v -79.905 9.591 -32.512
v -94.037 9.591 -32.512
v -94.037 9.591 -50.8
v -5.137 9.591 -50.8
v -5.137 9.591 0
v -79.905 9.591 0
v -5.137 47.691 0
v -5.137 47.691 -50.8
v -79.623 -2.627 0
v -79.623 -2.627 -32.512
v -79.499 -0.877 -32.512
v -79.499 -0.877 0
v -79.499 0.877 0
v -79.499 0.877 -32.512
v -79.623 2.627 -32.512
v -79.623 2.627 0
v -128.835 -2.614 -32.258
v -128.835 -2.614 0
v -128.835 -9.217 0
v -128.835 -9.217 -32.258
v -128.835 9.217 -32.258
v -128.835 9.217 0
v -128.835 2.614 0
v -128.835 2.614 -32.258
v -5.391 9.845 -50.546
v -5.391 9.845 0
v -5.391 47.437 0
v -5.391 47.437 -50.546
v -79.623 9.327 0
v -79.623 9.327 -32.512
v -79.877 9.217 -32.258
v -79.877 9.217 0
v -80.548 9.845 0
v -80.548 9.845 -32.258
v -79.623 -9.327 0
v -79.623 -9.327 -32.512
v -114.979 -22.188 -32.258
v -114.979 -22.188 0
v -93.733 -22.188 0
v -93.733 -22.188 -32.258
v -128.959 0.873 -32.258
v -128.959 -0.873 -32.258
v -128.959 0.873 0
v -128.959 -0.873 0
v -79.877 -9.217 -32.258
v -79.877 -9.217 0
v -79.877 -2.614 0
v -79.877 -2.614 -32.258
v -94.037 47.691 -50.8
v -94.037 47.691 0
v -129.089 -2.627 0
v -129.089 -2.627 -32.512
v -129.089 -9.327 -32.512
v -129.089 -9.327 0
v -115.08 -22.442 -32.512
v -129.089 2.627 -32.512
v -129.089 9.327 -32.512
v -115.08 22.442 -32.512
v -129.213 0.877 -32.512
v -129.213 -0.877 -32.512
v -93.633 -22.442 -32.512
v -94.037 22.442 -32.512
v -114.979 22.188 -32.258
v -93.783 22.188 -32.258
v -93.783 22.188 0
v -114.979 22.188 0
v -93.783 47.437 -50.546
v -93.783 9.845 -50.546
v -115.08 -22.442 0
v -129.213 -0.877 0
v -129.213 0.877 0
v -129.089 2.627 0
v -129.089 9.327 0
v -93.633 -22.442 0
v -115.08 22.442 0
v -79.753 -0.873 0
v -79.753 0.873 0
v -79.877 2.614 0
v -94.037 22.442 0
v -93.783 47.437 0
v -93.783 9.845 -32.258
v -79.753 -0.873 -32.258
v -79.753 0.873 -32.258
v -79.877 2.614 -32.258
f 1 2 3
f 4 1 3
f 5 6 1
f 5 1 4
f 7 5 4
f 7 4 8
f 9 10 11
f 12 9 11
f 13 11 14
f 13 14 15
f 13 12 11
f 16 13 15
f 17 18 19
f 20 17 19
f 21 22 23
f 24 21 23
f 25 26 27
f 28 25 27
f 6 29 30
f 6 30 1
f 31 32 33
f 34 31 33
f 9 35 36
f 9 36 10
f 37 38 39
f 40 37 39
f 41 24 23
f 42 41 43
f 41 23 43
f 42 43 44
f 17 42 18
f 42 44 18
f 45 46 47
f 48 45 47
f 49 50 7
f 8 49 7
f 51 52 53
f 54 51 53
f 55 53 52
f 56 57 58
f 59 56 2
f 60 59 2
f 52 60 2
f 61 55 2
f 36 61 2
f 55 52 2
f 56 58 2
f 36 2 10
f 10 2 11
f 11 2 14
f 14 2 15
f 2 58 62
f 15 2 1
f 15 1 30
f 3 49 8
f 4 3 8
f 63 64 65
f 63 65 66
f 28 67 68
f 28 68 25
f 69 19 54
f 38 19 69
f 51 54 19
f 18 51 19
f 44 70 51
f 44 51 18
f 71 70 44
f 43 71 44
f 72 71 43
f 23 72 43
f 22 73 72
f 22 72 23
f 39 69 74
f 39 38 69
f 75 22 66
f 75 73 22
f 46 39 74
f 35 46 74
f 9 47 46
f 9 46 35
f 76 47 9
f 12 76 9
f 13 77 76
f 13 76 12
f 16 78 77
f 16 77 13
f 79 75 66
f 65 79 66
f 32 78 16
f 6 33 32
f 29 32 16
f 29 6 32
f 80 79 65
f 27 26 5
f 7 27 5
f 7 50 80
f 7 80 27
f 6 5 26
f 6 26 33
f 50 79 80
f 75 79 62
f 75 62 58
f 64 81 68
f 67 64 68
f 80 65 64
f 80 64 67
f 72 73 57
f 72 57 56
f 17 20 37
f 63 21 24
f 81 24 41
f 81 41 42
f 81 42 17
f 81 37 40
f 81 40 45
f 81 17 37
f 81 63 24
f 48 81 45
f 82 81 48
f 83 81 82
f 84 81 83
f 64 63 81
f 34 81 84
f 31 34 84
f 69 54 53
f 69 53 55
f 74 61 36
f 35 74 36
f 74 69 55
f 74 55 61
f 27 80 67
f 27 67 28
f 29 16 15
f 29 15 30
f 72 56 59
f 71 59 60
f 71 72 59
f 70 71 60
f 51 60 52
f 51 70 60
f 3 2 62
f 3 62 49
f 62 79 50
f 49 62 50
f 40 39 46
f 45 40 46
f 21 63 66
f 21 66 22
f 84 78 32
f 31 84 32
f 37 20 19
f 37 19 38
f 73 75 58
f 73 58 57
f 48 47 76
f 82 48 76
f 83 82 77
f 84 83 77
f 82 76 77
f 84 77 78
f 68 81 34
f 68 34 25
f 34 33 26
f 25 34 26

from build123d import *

# Parameters (mm, degrees)
F1_W     = 88.9
F1_H     = 38.1
F2_DEPTH = 50.8
F3_DEPTH = 32.512
F4_T     = -0.254


with BuildPart() as f2:
    # F1 (on Top) → F2 (new body)
    with BuildSketch(Plane.XY):
        with Locations((-49.5874881029, 28.6405186608)):
            Rectangle(F1_W, F1_H)
    extrude(amount=-F2_DEPTH)

    # F0 (on Top) → F3 (join)
    with BuildSketch(Plane.XY):
        with BuildLine():
            Line((-129.0890981385, -2.6270174623), (-129.0890981385, 2.6270174623))
            ThreePointArc((-129.0890981385, 2.6270174623), (-129.2282210844, 0), (-129.0890981385, -2.6270174623))
        make_face()
        Polygon((-129.0890981385, 9.3266623309), (-129.0890981385, 2.6270174623), (-129.0890981385, -2.6270174623), (-129.0890981385, -9.3266623309), (-115.0795637781, -22.4417199168), (-93.6325612334, -22.4417199168), (-79.623026873, -9.3266623309), (-79.623026873, -2.6270174623), (-79.623026873, 2.6270174623), (-79.623026873, 9.3266623309), (-93.6325612334, 22.4417199168), (-115.0795637781, 22.4417199168), align=None)
        with BuildLine():
            ThreePointArc((-79.623026873, -2.6270174623), (-79.4839039271, 0), (-79.623026873, 2.6270174623))
            Line((-79.623026873, 2.6270174623), (-79.623026873, -2.6270174623))
        make_face()
    extrude(amount=-F3_DEPTH)

    # F4
    f4_openings = [f2.faces().sort_by_distance(p)[0] for p in [
        (-68.590003, 18.592115, 0),
    ]]
    offset(amount=F4_T, openings=f4_openings, kind=Kind.INTERSECTION)


solid = f2.part
